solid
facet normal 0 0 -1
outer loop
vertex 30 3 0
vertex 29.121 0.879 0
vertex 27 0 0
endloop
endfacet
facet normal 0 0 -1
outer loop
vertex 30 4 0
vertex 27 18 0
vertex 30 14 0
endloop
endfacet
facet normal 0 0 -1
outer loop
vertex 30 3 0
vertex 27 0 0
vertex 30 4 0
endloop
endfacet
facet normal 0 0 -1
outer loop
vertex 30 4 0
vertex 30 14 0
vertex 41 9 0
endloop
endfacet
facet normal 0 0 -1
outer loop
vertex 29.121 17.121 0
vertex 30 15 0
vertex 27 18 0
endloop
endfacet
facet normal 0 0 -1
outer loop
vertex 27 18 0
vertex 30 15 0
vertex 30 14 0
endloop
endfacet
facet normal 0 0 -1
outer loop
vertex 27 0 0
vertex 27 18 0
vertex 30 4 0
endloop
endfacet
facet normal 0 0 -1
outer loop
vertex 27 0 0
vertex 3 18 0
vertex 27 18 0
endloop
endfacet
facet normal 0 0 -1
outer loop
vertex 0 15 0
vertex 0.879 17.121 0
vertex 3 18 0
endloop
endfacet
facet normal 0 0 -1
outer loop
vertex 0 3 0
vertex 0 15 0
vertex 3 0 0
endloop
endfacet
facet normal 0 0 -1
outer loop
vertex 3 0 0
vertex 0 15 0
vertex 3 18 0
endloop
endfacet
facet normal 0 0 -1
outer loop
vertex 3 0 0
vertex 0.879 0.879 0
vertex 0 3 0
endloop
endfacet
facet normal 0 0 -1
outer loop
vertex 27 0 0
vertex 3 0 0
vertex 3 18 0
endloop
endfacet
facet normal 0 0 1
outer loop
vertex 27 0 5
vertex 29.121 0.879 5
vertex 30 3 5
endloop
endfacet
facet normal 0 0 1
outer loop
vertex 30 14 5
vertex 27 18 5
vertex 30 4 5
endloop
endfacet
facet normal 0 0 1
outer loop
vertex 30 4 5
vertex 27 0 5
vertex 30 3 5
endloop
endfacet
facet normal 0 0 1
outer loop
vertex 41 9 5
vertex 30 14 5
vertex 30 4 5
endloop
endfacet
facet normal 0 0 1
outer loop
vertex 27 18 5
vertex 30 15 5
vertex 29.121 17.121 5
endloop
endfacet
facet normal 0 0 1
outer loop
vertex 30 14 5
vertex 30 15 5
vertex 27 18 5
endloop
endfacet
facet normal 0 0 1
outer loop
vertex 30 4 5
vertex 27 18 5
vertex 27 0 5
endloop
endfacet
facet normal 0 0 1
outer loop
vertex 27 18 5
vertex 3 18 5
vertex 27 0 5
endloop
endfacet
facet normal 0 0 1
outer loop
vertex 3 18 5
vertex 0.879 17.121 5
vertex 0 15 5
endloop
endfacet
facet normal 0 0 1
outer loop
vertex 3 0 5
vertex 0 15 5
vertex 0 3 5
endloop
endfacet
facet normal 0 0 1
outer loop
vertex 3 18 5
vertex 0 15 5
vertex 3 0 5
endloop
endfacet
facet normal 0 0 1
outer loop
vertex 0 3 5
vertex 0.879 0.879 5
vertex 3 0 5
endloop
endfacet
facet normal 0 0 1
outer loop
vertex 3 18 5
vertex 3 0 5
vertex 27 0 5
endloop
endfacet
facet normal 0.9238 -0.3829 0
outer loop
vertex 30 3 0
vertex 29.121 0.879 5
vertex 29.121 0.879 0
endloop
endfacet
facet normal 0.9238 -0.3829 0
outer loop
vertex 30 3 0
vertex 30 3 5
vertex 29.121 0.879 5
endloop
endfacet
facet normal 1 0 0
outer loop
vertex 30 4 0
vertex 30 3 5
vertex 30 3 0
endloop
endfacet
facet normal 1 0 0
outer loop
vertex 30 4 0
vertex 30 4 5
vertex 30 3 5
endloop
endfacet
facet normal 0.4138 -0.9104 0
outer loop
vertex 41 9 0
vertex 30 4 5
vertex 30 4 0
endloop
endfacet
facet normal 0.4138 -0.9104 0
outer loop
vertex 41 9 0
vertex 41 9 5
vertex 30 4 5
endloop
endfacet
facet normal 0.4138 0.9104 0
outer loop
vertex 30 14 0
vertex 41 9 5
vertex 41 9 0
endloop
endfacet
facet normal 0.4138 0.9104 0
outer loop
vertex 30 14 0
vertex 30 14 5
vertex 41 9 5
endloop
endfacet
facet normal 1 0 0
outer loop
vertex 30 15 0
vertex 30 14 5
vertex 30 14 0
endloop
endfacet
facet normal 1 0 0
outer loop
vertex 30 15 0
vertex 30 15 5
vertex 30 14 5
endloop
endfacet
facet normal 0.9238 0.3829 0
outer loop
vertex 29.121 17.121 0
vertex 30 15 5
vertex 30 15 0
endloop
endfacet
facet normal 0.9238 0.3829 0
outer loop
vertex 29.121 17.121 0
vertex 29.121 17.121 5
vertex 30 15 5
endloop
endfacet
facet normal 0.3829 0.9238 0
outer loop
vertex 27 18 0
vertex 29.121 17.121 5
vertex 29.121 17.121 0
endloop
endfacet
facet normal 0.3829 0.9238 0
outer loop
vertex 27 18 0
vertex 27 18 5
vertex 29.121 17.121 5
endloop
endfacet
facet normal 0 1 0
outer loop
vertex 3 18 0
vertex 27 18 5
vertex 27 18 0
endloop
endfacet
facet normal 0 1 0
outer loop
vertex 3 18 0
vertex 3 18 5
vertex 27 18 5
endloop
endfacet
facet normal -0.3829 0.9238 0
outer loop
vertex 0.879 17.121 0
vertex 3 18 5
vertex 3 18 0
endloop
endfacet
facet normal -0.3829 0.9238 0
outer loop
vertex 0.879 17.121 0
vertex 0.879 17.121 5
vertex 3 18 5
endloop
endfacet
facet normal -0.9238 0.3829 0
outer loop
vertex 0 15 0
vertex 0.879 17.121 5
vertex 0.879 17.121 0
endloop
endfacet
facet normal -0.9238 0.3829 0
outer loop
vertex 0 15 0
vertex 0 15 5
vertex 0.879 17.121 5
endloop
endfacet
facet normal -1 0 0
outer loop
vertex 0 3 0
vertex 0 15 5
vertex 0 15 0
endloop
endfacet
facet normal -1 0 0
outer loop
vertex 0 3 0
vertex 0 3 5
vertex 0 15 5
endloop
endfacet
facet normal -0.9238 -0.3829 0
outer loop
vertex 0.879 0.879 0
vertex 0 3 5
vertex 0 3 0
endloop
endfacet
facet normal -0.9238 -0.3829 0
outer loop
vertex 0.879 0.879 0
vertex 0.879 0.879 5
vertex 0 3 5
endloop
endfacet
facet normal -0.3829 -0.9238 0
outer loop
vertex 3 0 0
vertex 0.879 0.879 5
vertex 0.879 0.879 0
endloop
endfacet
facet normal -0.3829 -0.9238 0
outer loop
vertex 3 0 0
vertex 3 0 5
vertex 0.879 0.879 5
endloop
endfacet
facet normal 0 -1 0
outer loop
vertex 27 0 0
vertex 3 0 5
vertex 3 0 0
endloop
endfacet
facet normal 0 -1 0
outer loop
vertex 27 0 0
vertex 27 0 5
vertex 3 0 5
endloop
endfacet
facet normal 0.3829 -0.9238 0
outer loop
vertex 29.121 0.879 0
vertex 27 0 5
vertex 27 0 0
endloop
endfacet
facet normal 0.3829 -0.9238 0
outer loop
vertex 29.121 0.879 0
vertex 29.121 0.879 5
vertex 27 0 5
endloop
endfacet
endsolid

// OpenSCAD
$fn = 32;

// ----------------------------------------------------------------------
// Ratchet pawl: 30 x 18 mm body, beak 11 mm с правого торца
// ----------------------------------------------------------------------

// --- parameters (mm) ---
profile_height = 5;       // extrusion height
profile_points = 15;      // points of the closed outline

profile = [[0, 3], [0.879, 0.879], [3, 0], [27, 0], [29.121, 0.879], [30, 3], [30, 4], [41, 9], [30, 14], [30, 15], [29.121, 17.121], [27, 18], [3, 18], [0.879, 17.121], [0, 15]];  // single closed polygon, 15 points, counter clockwise

// --- the one profile operation ---
linear_extrude(height = profile_height) polygon(points = profile);
